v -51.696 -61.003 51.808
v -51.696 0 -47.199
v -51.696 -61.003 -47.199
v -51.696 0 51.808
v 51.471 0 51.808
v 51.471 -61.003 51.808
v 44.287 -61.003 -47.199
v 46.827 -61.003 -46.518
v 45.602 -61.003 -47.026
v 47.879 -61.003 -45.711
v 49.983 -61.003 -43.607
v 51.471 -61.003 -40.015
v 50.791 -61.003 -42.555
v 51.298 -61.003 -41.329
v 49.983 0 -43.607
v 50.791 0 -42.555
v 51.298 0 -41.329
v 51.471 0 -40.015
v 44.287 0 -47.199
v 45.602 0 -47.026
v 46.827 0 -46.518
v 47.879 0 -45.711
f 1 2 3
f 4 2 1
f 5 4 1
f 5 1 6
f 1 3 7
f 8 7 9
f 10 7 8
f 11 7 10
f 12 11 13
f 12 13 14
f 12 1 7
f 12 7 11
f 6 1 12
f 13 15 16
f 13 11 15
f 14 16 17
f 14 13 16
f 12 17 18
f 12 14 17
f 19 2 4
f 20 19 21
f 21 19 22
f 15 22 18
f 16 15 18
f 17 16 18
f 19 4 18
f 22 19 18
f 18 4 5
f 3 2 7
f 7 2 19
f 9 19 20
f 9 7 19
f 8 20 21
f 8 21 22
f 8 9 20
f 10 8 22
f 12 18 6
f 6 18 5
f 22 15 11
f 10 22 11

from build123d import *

# Parameters (mm, degrees)
F0_W     = 103.1671874225
F0_H     = 99.0072153509
F1_DEPTH = 61.00262
F2_SIZE  = 5.08
F3_R     = 5.08


with BuildPart() as f1:
    # F0 (on Front) → F1 (new body)
    with BuildSketch(Plane.XZ):
        with Locations((-0.1124907285, 2.3048538715)):
            Rectangle(F0_W, F0_H)
    extrude(amount=F1_DEPTH)

    # F2
    f2_edges = [f1.edges().sort_by_distance(p)[0] for p in [
        (51.471103, -30.50131, -47.198754),
    ]]
    chamfer(f2_edges, length=F2_SIZE)

    # F3
    f3_edges = [f1.edges().sort_by_distance(p)[0] for p in [
        (51.471103, -30.50131, -42.118754),
        (46.391103, -30.50131, -47.198754),
    ]]
    fillet(f3_edges, radius=F3_R)


solid = f1.part
